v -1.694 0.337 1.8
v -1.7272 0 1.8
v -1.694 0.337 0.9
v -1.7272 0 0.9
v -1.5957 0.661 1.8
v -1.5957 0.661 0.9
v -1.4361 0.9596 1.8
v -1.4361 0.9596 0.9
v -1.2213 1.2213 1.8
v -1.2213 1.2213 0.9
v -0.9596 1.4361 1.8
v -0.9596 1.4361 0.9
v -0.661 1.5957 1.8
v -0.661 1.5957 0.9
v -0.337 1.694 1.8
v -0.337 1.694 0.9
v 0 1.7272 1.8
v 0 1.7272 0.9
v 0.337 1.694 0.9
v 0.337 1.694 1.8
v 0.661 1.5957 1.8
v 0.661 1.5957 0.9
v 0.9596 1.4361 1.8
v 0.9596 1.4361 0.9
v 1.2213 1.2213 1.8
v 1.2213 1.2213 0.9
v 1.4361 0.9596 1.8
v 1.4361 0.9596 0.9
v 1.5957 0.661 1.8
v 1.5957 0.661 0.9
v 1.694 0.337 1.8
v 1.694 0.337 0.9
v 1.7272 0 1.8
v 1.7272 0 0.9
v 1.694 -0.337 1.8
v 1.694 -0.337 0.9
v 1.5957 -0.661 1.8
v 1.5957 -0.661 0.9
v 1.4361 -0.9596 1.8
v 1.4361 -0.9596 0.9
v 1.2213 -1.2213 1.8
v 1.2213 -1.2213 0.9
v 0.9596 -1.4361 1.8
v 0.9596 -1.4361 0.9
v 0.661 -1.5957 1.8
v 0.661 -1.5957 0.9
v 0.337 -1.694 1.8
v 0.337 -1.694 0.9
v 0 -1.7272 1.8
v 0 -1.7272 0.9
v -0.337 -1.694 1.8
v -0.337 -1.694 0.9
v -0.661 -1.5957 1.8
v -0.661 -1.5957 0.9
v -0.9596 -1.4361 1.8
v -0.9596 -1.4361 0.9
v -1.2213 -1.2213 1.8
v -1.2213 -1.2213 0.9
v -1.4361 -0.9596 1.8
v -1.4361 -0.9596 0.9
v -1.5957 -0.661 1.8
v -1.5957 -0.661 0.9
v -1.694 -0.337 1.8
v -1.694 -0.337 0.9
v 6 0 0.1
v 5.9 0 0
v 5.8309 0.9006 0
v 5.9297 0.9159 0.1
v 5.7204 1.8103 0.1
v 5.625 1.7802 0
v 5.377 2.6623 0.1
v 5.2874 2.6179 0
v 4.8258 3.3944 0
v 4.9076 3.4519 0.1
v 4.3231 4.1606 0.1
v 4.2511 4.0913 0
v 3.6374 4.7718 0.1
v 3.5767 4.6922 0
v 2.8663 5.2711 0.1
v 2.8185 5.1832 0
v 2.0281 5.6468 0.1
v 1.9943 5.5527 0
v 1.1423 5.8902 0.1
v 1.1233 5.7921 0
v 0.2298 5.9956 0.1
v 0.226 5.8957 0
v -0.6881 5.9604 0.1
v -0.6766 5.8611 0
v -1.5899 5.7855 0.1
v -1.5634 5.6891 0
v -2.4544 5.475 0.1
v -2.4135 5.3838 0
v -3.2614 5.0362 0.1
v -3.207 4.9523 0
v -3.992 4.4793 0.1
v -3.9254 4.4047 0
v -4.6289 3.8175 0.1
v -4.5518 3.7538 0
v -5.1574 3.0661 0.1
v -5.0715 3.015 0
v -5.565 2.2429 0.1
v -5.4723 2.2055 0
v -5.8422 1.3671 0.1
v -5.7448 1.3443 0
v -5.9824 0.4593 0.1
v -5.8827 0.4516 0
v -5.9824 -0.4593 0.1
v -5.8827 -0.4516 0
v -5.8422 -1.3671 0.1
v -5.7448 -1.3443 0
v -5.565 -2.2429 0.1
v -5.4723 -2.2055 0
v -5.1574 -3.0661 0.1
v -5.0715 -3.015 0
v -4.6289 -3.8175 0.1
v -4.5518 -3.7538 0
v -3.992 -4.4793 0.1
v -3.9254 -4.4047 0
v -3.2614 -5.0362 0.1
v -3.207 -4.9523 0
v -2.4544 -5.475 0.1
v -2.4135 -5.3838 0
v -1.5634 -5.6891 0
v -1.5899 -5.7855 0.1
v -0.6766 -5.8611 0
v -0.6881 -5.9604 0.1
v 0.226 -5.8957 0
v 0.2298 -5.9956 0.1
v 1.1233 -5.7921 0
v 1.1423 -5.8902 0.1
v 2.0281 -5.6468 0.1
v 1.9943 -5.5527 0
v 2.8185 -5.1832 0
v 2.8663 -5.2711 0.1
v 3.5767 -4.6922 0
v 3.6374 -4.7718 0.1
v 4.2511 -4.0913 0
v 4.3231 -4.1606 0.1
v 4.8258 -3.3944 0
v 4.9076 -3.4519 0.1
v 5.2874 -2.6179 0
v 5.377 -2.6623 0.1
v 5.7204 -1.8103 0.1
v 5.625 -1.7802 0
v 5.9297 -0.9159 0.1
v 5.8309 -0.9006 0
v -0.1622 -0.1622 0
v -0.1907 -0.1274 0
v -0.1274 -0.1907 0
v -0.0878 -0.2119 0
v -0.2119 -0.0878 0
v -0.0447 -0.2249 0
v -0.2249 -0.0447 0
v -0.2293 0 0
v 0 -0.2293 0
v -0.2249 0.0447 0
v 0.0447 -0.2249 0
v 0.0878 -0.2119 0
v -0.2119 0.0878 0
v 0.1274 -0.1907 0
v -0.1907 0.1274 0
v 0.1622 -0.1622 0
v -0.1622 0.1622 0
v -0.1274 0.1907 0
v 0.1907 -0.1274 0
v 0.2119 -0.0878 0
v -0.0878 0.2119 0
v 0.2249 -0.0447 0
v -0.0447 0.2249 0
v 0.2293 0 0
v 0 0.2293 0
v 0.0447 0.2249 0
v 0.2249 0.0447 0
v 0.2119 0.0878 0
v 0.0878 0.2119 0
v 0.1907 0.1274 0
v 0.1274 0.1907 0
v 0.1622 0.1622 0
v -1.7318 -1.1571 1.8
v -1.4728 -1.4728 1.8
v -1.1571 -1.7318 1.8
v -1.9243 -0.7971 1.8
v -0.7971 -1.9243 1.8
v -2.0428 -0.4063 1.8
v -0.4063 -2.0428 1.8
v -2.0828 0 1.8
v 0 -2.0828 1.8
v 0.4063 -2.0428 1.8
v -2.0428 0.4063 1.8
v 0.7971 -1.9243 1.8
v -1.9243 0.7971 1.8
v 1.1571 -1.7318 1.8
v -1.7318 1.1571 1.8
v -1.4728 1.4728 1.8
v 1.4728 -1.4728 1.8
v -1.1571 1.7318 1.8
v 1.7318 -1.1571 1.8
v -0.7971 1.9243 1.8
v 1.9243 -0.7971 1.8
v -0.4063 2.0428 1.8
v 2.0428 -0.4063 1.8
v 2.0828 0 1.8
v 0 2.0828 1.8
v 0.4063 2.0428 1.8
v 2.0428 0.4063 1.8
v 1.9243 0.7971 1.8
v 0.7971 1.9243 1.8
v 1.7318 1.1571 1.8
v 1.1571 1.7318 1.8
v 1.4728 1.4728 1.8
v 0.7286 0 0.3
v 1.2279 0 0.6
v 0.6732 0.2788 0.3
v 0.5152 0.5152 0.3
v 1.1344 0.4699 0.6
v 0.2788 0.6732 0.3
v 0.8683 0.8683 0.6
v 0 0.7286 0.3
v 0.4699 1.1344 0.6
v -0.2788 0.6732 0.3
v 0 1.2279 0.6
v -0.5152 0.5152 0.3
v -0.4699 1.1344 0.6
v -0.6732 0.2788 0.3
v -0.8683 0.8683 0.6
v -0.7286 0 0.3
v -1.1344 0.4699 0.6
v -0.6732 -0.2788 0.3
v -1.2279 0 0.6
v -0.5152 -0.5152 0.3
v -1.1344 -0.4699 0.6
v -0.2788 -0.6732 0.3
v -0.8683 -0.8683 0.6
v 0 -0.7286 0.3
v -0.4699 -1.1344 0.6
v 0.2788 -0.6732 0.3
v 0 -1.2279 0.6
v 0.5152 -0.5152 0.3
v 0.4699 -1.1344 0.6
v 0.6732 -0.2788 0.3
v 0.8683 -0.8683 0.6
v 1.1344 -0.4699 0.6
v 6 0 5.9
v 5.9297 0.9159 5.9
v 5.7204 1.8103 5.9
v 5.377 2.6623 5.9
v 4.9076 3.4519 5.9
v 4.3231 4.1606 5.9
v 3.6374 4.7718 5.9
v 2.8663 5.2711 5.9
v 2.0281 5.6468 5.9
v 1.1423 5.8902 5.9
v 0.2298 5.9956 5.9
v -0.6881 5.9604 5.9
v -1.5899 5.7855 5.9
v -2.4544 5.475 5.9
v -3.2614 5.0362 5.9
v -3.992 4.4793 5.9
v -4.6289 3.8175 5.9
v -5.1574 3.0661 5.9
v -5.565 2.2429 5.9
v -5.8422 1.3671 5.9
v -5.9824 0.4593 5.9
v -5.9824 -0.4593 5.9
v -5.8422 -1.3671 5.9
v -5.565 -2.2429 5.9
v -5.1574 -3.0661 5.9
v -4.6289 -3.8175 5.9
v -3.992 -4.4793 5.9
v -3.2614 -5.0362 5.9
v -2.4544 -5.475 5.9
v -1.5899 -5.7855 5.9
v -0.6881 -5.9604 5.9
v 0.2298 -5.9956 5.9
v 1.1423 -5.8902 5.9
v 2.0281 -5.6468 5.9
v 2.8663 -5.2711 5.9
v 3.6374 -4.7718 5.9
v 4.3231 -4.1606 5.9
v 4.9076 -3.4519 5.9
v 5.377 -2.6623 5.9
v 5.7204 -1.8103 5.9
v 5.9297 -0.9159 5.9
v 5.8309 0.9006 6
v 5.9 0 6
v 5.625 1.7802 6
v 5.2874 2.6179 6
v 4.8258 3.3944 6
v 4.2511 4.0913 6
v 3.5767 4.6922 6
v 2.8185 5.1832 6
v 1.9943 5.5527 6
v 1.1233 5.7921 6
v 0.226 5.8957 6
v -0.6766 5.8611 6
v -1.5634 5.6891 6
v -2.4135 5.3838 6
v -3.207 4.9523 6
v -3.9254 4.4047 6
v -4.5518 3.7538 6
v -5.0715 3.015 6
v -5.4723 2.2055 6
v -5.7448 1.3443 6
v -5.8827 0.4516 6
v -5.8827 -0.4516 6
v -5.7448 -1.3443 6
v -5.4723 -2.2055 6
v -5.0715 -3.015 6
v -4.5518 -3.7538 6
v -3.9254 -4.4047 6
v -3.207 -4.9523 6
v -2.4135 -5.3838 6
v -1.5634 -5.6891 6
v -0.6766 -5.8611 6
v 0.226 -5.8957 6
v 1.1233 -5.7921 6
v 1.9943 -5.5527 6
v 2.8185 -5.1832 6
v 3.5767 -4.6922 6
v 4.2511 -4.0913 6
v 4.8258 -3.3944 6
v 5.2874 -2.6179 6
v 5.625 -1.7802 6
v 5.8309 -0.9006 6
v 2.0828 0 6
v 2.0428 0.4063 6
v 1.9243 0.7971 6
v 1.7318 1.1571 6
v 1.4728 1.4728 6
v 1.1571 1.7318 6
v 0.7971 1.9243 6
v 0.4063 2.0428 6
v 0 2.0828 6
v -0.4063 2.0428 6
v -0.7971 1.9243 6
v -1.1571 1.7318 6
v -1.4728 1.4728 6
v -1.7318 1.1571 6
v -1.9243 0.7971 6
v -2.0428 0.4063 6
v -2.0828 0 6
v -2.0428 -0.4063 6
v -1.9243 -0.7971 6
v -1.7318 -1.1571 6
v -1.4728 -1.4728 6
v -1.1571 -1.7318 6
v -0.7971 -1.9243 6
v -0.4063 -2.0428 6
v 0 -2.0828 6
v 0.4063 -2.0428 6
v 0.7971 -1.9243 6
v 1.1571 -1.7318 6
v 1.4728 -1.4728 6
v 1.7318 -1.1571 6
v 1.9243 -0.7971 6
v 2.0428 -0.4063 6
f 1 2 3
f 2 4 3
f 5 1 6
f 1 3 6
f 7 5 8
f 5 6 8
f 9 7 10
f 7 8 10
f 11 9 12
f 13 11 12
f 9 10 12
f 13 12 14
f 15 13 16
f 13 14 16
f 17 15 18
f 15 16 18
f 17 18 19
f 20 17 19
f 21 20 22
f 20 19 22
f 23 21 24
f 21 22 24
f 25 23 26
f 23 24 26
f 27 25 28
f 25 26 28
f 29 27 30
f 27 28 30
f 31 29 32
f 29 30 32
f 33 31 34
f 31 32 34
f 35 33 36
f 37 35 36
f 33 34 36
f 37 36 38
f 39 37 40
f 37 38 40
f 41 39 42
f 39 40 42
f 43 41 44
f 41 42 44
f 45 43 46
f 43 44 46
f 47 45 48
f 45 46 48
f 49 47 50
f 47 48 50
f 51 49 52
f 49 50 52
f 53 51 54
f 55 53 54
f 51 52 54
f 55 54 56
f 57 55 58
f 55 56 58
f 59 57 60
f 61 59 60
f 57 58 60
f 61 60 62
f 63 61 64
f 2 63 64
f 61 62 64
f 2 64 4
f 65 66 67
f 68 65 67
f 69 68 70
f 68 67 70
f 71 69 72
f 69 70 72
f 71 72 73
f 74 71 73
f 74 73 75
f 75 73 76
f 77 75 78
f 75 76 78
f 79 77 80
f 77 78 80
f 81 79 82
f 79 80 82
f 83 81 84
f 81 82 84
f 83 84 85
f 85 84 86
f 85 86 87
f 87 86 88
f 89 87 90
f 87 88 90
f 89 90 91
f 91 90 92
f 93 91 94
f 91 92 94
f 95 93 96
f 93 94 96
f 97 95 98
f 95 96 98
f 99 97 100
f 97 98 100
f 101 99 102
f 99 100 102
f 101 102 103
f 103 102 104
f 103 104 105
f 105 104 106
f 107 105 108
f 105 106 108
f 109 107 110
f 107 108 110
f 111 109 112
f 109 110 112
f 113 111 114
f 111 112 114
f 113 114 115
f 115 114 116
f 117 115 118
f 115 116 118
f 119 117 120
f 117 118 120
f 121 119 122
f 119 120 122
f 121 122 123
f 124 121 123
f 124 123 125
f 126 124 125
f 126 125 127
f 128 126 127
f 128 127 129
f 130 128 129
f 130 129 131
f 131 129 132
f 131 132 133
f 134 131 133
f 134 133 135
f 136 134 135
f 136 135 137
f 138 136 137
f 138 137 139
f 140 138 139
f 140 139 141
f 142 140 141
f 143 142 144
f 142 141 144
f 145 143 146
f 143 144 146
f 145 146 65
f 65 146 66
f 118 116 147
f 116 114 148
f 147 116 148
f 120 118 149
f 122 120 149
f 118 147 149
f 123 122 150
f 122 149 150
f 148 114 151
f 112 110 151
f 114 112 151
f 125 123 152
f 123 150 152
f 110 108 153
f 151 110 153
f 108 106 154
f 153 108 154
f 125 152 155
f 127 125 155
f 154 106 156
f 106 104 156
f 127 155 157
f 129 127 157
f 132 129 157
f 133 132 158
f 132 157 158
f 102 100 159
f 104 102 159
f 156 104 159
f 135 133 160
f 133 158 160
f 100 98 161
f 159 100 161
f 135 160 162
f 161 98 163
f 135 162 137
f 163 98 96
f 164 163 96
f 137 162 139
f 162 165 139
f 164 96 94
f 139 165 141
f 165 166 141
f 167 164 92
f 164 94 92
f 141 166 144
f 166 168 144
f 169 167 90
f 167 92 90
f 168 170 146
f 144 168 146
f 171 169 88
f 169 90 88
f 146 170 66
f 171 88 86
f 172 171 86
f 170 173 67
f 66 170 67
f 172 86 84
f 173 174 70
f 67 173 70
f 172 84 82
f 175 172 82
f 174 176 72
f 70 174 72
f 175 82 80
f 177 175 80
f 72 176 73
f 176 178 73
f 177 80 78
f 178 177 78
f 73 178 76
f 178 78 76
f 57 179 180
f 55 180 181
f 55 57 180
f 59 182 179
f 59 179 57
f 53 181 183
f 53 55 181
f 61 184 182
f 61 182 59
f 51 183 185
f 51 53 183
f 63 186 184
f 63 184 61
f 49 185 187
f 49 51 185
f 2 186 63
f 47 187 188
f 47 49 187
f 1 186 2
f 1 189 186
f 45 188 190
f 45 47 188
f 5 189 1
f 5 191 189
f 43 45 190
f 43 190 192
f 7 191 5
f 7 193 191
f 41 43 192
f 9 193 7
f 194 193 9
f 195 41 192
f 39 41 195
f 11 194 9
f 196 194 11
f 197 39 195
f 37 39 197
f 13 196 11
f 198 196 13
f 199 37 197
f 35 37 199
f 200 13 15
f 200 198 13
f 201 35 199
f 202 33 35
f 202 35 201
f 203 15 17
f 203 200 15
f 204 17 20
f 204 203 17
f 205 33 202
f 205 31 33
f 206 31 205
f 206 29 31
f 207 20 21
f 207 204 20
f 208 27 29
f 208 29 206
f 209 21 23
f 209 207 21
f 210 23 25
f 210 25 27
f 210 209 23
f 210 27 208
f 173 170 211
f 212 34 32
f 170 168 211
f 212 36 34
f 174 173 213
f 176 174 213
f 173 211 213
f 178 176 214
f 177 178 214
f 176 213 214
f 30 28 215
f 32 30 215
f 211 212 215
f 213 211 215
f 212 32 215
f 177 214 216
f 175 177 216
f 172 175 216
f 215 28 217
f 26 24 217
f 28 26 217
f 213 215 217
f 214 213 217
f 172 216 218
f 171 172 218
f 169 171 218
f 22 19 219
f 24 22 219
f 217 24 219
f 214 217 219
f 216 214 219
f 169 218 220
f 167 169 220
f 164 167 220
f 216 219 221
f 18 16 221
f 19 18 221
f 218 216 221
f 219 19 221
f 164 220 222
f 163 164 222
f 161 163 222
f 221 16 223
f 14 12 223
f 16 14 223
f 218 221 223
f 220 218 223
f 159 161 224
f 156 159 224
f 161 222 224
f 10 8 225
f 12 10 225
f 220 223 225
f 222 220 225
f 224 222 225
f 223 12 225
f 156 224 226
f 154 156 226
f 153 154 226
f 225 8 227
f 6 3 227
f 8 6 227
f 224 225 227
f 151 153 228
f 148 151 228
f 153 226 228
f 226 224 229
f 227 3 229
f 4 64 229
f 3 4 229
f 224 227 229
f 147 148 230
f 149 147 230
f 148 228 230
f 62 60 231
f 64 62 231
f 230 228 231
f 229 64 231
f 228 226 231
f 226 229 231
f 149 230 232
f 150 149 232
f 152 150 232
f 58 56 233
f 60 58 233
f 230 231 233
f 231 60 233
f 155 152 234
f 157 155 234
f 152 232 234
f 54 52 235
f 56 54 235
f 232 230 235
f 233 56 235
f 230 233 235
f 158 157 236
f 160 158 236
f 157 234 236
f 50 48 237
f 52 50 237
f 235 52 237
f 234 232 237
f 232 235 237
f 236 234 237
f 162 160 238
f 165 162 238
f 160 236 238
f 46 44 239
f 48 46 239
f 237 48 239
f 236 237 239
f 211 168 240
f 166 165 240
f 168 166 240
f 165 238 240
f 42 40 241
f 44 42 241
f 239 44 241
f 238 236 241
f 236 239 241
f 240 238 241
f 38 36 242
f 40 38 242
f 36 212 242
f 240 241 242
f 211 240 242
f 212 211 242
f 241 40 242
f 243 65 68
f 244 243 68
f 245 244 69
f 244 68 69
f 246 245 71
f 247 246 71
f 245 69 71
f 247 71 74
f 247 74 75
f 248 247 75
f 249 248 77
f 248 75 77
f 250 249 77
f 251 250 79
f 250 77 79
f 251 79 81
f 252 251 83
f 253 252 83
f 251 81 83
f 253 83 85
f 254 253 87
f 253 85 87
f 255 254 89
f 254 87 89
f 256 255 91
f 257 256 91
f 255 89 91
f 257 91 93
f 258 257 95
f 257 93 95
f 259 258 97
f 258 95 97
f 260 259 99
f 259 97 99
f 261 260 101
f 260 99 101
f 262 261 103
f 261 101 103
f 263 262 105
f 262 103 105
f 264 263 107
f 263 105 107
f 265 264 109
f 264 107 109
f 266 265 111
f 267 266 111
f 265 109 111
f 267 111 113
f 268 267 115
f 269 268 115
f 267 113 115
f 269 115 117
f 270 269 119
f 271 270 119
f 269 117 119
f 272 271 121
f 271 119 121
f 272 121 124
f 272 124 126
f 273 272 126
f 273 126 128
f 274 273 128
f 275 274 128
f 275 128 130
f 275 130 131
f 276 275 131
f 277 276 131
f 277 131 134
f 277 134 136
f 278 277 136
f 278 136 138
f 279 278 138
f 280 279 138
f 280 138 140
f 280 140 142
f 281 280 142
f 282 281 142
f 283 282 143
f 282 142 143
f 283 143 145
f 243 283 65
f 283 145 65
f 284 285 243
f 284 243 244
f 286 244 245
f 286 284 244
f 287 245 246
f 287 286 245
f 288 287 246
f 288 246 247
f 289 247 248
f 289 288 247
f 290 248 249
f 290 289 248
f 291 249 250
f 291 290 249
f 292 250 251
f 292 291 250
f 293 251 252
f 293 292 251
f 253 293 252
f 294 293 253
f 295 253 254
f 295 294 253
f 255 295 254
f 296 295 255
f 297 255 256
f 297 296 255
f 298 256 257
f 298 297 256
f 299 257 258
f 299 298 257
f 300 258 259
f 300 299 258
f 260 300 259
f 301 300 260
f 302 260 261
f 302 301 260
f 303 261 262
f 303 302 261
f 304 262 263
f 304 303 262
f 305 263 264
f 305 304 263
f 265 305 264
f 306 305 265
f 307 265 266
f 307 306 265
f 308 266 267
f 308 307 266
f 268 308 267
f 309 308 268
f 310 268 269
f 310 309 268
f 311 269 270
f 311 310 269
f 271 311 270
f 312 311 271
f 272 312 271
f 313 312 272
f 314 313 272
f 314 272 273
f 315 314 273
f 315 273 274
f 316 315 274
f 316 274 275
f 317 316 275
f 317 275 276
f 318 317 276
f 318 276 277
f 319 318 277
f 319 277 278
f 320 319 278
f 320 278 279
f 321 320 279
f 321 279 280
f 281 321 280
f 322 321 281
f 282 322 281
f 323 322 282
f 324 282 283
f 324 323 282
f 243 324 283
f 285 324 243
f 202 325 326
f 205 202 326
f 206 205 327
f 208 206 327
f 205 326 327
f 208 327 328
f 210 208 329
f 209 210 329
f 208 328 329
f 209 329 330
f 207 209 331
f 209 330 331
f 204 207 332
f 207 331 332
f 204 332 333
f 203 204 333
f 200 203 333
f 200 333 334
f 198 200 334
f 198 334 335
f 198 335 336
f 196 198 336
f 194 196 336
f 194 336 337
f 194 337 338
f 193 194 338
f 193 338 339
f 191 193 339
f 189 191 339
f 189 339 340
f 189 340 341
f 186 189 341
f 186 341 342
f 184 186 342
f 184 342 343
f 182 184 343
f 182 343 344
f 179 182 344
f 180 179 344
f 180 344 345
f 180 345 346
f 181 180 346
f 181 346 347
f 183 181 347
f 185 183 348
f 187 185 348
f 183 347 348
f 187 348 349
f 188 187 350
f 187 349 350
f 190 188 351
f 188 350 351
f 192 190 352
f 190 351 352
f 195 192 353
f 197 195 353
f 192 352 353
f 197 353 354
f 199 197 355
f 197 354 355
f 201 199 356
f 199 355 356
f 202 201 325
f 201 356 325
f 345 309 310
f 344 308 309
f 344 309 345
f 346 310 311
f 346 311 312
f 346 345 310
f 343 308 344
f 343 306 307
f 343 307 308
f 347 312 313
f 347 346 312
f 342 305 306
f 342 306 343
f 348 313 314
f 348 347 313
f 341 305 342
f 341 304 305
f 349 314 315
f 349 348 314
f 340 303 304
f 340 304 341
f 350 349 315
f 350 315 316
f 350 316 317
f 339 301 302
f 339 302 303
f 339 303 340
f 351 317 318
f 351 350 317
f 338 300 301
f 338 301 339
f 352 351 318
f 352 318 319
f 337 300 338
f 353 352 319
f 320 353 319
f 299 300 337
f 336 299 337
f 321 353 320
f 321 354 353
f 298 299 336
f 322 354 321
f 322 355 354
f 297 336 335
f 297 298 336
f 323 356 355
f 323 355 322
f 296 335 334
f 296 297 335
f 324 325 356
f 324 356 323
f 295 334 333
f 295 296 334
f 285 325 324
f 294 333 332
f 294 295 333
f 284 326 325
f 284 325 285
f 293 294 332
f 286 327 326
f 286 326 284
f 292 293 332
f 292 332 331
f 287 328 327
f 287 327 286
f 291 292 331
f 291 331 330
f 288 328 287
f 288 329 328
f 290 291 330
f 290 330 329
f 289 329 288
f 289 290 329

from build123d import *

# Parameters (mm, degrees)
SKETCH1_R                       = 6
BOSS_EXTRUDE1_DEPTH             = 6
F_8_32_TAPPED_HOLE1_D           = 3.4544
F_8_32_TAPPED_HOLE1_DEPTH       = 5.1
F_8_32_TAPPED_HOLE1_CBORE_D     = 4.1656
F_8_32_TAPPED_HOLE1_CBORE_DEPTH = 4.2
F_8_32_TAPPED_HOLE1_TIP         = 1.037806461
CHAMFER1_SIZE                   = 0.1


with BuildPart() as part:
    # Sketch1 → Boss-Extrude1 (new body)
    with BuildSketch(Plane.XY):
        Circle(SKETCH1_R)
    extrude(amount=BOSS_EXTRUDE1_DEPTH)

    # #8-32 Tapped Hole1
    with Locations(Plane.XY.offset(6)):
        with Locations((0, 0)):
            CounterBoreHole(F_8_32_TAPPED_HOLE1_D / 2, F_8_32_TAPPED_HOLE1_CBORE_D / 2, F_8_32_TAPPED_HOLE1_CBORE_DEPTH, depth=F_8_32_TAPPED_HOLE1_DEPTH)
            with Locations((0, 0, -(F_8_32_TAPPED_HOLE1_DEPTH + F_8_32_TAPPED_HOLE1_TIP / 2))):  # 118° drill point
                Cone(0, F_8_32_TAPPED_HOLE1_D / 2, F_8_32_TAPPED_HOLE1_TIP, mode=Mode.SUBTRACT)

    # Chamfer1
    chamfer1_edges = [part.edges().sort_by_distance(p)[0] for p in [
        (-6, 0, 0),
        (-6, 0, 6),
    ]]
    chamfer(chamfer1_edges, length=CHAMFER1_SIZE)


solid = part.part
